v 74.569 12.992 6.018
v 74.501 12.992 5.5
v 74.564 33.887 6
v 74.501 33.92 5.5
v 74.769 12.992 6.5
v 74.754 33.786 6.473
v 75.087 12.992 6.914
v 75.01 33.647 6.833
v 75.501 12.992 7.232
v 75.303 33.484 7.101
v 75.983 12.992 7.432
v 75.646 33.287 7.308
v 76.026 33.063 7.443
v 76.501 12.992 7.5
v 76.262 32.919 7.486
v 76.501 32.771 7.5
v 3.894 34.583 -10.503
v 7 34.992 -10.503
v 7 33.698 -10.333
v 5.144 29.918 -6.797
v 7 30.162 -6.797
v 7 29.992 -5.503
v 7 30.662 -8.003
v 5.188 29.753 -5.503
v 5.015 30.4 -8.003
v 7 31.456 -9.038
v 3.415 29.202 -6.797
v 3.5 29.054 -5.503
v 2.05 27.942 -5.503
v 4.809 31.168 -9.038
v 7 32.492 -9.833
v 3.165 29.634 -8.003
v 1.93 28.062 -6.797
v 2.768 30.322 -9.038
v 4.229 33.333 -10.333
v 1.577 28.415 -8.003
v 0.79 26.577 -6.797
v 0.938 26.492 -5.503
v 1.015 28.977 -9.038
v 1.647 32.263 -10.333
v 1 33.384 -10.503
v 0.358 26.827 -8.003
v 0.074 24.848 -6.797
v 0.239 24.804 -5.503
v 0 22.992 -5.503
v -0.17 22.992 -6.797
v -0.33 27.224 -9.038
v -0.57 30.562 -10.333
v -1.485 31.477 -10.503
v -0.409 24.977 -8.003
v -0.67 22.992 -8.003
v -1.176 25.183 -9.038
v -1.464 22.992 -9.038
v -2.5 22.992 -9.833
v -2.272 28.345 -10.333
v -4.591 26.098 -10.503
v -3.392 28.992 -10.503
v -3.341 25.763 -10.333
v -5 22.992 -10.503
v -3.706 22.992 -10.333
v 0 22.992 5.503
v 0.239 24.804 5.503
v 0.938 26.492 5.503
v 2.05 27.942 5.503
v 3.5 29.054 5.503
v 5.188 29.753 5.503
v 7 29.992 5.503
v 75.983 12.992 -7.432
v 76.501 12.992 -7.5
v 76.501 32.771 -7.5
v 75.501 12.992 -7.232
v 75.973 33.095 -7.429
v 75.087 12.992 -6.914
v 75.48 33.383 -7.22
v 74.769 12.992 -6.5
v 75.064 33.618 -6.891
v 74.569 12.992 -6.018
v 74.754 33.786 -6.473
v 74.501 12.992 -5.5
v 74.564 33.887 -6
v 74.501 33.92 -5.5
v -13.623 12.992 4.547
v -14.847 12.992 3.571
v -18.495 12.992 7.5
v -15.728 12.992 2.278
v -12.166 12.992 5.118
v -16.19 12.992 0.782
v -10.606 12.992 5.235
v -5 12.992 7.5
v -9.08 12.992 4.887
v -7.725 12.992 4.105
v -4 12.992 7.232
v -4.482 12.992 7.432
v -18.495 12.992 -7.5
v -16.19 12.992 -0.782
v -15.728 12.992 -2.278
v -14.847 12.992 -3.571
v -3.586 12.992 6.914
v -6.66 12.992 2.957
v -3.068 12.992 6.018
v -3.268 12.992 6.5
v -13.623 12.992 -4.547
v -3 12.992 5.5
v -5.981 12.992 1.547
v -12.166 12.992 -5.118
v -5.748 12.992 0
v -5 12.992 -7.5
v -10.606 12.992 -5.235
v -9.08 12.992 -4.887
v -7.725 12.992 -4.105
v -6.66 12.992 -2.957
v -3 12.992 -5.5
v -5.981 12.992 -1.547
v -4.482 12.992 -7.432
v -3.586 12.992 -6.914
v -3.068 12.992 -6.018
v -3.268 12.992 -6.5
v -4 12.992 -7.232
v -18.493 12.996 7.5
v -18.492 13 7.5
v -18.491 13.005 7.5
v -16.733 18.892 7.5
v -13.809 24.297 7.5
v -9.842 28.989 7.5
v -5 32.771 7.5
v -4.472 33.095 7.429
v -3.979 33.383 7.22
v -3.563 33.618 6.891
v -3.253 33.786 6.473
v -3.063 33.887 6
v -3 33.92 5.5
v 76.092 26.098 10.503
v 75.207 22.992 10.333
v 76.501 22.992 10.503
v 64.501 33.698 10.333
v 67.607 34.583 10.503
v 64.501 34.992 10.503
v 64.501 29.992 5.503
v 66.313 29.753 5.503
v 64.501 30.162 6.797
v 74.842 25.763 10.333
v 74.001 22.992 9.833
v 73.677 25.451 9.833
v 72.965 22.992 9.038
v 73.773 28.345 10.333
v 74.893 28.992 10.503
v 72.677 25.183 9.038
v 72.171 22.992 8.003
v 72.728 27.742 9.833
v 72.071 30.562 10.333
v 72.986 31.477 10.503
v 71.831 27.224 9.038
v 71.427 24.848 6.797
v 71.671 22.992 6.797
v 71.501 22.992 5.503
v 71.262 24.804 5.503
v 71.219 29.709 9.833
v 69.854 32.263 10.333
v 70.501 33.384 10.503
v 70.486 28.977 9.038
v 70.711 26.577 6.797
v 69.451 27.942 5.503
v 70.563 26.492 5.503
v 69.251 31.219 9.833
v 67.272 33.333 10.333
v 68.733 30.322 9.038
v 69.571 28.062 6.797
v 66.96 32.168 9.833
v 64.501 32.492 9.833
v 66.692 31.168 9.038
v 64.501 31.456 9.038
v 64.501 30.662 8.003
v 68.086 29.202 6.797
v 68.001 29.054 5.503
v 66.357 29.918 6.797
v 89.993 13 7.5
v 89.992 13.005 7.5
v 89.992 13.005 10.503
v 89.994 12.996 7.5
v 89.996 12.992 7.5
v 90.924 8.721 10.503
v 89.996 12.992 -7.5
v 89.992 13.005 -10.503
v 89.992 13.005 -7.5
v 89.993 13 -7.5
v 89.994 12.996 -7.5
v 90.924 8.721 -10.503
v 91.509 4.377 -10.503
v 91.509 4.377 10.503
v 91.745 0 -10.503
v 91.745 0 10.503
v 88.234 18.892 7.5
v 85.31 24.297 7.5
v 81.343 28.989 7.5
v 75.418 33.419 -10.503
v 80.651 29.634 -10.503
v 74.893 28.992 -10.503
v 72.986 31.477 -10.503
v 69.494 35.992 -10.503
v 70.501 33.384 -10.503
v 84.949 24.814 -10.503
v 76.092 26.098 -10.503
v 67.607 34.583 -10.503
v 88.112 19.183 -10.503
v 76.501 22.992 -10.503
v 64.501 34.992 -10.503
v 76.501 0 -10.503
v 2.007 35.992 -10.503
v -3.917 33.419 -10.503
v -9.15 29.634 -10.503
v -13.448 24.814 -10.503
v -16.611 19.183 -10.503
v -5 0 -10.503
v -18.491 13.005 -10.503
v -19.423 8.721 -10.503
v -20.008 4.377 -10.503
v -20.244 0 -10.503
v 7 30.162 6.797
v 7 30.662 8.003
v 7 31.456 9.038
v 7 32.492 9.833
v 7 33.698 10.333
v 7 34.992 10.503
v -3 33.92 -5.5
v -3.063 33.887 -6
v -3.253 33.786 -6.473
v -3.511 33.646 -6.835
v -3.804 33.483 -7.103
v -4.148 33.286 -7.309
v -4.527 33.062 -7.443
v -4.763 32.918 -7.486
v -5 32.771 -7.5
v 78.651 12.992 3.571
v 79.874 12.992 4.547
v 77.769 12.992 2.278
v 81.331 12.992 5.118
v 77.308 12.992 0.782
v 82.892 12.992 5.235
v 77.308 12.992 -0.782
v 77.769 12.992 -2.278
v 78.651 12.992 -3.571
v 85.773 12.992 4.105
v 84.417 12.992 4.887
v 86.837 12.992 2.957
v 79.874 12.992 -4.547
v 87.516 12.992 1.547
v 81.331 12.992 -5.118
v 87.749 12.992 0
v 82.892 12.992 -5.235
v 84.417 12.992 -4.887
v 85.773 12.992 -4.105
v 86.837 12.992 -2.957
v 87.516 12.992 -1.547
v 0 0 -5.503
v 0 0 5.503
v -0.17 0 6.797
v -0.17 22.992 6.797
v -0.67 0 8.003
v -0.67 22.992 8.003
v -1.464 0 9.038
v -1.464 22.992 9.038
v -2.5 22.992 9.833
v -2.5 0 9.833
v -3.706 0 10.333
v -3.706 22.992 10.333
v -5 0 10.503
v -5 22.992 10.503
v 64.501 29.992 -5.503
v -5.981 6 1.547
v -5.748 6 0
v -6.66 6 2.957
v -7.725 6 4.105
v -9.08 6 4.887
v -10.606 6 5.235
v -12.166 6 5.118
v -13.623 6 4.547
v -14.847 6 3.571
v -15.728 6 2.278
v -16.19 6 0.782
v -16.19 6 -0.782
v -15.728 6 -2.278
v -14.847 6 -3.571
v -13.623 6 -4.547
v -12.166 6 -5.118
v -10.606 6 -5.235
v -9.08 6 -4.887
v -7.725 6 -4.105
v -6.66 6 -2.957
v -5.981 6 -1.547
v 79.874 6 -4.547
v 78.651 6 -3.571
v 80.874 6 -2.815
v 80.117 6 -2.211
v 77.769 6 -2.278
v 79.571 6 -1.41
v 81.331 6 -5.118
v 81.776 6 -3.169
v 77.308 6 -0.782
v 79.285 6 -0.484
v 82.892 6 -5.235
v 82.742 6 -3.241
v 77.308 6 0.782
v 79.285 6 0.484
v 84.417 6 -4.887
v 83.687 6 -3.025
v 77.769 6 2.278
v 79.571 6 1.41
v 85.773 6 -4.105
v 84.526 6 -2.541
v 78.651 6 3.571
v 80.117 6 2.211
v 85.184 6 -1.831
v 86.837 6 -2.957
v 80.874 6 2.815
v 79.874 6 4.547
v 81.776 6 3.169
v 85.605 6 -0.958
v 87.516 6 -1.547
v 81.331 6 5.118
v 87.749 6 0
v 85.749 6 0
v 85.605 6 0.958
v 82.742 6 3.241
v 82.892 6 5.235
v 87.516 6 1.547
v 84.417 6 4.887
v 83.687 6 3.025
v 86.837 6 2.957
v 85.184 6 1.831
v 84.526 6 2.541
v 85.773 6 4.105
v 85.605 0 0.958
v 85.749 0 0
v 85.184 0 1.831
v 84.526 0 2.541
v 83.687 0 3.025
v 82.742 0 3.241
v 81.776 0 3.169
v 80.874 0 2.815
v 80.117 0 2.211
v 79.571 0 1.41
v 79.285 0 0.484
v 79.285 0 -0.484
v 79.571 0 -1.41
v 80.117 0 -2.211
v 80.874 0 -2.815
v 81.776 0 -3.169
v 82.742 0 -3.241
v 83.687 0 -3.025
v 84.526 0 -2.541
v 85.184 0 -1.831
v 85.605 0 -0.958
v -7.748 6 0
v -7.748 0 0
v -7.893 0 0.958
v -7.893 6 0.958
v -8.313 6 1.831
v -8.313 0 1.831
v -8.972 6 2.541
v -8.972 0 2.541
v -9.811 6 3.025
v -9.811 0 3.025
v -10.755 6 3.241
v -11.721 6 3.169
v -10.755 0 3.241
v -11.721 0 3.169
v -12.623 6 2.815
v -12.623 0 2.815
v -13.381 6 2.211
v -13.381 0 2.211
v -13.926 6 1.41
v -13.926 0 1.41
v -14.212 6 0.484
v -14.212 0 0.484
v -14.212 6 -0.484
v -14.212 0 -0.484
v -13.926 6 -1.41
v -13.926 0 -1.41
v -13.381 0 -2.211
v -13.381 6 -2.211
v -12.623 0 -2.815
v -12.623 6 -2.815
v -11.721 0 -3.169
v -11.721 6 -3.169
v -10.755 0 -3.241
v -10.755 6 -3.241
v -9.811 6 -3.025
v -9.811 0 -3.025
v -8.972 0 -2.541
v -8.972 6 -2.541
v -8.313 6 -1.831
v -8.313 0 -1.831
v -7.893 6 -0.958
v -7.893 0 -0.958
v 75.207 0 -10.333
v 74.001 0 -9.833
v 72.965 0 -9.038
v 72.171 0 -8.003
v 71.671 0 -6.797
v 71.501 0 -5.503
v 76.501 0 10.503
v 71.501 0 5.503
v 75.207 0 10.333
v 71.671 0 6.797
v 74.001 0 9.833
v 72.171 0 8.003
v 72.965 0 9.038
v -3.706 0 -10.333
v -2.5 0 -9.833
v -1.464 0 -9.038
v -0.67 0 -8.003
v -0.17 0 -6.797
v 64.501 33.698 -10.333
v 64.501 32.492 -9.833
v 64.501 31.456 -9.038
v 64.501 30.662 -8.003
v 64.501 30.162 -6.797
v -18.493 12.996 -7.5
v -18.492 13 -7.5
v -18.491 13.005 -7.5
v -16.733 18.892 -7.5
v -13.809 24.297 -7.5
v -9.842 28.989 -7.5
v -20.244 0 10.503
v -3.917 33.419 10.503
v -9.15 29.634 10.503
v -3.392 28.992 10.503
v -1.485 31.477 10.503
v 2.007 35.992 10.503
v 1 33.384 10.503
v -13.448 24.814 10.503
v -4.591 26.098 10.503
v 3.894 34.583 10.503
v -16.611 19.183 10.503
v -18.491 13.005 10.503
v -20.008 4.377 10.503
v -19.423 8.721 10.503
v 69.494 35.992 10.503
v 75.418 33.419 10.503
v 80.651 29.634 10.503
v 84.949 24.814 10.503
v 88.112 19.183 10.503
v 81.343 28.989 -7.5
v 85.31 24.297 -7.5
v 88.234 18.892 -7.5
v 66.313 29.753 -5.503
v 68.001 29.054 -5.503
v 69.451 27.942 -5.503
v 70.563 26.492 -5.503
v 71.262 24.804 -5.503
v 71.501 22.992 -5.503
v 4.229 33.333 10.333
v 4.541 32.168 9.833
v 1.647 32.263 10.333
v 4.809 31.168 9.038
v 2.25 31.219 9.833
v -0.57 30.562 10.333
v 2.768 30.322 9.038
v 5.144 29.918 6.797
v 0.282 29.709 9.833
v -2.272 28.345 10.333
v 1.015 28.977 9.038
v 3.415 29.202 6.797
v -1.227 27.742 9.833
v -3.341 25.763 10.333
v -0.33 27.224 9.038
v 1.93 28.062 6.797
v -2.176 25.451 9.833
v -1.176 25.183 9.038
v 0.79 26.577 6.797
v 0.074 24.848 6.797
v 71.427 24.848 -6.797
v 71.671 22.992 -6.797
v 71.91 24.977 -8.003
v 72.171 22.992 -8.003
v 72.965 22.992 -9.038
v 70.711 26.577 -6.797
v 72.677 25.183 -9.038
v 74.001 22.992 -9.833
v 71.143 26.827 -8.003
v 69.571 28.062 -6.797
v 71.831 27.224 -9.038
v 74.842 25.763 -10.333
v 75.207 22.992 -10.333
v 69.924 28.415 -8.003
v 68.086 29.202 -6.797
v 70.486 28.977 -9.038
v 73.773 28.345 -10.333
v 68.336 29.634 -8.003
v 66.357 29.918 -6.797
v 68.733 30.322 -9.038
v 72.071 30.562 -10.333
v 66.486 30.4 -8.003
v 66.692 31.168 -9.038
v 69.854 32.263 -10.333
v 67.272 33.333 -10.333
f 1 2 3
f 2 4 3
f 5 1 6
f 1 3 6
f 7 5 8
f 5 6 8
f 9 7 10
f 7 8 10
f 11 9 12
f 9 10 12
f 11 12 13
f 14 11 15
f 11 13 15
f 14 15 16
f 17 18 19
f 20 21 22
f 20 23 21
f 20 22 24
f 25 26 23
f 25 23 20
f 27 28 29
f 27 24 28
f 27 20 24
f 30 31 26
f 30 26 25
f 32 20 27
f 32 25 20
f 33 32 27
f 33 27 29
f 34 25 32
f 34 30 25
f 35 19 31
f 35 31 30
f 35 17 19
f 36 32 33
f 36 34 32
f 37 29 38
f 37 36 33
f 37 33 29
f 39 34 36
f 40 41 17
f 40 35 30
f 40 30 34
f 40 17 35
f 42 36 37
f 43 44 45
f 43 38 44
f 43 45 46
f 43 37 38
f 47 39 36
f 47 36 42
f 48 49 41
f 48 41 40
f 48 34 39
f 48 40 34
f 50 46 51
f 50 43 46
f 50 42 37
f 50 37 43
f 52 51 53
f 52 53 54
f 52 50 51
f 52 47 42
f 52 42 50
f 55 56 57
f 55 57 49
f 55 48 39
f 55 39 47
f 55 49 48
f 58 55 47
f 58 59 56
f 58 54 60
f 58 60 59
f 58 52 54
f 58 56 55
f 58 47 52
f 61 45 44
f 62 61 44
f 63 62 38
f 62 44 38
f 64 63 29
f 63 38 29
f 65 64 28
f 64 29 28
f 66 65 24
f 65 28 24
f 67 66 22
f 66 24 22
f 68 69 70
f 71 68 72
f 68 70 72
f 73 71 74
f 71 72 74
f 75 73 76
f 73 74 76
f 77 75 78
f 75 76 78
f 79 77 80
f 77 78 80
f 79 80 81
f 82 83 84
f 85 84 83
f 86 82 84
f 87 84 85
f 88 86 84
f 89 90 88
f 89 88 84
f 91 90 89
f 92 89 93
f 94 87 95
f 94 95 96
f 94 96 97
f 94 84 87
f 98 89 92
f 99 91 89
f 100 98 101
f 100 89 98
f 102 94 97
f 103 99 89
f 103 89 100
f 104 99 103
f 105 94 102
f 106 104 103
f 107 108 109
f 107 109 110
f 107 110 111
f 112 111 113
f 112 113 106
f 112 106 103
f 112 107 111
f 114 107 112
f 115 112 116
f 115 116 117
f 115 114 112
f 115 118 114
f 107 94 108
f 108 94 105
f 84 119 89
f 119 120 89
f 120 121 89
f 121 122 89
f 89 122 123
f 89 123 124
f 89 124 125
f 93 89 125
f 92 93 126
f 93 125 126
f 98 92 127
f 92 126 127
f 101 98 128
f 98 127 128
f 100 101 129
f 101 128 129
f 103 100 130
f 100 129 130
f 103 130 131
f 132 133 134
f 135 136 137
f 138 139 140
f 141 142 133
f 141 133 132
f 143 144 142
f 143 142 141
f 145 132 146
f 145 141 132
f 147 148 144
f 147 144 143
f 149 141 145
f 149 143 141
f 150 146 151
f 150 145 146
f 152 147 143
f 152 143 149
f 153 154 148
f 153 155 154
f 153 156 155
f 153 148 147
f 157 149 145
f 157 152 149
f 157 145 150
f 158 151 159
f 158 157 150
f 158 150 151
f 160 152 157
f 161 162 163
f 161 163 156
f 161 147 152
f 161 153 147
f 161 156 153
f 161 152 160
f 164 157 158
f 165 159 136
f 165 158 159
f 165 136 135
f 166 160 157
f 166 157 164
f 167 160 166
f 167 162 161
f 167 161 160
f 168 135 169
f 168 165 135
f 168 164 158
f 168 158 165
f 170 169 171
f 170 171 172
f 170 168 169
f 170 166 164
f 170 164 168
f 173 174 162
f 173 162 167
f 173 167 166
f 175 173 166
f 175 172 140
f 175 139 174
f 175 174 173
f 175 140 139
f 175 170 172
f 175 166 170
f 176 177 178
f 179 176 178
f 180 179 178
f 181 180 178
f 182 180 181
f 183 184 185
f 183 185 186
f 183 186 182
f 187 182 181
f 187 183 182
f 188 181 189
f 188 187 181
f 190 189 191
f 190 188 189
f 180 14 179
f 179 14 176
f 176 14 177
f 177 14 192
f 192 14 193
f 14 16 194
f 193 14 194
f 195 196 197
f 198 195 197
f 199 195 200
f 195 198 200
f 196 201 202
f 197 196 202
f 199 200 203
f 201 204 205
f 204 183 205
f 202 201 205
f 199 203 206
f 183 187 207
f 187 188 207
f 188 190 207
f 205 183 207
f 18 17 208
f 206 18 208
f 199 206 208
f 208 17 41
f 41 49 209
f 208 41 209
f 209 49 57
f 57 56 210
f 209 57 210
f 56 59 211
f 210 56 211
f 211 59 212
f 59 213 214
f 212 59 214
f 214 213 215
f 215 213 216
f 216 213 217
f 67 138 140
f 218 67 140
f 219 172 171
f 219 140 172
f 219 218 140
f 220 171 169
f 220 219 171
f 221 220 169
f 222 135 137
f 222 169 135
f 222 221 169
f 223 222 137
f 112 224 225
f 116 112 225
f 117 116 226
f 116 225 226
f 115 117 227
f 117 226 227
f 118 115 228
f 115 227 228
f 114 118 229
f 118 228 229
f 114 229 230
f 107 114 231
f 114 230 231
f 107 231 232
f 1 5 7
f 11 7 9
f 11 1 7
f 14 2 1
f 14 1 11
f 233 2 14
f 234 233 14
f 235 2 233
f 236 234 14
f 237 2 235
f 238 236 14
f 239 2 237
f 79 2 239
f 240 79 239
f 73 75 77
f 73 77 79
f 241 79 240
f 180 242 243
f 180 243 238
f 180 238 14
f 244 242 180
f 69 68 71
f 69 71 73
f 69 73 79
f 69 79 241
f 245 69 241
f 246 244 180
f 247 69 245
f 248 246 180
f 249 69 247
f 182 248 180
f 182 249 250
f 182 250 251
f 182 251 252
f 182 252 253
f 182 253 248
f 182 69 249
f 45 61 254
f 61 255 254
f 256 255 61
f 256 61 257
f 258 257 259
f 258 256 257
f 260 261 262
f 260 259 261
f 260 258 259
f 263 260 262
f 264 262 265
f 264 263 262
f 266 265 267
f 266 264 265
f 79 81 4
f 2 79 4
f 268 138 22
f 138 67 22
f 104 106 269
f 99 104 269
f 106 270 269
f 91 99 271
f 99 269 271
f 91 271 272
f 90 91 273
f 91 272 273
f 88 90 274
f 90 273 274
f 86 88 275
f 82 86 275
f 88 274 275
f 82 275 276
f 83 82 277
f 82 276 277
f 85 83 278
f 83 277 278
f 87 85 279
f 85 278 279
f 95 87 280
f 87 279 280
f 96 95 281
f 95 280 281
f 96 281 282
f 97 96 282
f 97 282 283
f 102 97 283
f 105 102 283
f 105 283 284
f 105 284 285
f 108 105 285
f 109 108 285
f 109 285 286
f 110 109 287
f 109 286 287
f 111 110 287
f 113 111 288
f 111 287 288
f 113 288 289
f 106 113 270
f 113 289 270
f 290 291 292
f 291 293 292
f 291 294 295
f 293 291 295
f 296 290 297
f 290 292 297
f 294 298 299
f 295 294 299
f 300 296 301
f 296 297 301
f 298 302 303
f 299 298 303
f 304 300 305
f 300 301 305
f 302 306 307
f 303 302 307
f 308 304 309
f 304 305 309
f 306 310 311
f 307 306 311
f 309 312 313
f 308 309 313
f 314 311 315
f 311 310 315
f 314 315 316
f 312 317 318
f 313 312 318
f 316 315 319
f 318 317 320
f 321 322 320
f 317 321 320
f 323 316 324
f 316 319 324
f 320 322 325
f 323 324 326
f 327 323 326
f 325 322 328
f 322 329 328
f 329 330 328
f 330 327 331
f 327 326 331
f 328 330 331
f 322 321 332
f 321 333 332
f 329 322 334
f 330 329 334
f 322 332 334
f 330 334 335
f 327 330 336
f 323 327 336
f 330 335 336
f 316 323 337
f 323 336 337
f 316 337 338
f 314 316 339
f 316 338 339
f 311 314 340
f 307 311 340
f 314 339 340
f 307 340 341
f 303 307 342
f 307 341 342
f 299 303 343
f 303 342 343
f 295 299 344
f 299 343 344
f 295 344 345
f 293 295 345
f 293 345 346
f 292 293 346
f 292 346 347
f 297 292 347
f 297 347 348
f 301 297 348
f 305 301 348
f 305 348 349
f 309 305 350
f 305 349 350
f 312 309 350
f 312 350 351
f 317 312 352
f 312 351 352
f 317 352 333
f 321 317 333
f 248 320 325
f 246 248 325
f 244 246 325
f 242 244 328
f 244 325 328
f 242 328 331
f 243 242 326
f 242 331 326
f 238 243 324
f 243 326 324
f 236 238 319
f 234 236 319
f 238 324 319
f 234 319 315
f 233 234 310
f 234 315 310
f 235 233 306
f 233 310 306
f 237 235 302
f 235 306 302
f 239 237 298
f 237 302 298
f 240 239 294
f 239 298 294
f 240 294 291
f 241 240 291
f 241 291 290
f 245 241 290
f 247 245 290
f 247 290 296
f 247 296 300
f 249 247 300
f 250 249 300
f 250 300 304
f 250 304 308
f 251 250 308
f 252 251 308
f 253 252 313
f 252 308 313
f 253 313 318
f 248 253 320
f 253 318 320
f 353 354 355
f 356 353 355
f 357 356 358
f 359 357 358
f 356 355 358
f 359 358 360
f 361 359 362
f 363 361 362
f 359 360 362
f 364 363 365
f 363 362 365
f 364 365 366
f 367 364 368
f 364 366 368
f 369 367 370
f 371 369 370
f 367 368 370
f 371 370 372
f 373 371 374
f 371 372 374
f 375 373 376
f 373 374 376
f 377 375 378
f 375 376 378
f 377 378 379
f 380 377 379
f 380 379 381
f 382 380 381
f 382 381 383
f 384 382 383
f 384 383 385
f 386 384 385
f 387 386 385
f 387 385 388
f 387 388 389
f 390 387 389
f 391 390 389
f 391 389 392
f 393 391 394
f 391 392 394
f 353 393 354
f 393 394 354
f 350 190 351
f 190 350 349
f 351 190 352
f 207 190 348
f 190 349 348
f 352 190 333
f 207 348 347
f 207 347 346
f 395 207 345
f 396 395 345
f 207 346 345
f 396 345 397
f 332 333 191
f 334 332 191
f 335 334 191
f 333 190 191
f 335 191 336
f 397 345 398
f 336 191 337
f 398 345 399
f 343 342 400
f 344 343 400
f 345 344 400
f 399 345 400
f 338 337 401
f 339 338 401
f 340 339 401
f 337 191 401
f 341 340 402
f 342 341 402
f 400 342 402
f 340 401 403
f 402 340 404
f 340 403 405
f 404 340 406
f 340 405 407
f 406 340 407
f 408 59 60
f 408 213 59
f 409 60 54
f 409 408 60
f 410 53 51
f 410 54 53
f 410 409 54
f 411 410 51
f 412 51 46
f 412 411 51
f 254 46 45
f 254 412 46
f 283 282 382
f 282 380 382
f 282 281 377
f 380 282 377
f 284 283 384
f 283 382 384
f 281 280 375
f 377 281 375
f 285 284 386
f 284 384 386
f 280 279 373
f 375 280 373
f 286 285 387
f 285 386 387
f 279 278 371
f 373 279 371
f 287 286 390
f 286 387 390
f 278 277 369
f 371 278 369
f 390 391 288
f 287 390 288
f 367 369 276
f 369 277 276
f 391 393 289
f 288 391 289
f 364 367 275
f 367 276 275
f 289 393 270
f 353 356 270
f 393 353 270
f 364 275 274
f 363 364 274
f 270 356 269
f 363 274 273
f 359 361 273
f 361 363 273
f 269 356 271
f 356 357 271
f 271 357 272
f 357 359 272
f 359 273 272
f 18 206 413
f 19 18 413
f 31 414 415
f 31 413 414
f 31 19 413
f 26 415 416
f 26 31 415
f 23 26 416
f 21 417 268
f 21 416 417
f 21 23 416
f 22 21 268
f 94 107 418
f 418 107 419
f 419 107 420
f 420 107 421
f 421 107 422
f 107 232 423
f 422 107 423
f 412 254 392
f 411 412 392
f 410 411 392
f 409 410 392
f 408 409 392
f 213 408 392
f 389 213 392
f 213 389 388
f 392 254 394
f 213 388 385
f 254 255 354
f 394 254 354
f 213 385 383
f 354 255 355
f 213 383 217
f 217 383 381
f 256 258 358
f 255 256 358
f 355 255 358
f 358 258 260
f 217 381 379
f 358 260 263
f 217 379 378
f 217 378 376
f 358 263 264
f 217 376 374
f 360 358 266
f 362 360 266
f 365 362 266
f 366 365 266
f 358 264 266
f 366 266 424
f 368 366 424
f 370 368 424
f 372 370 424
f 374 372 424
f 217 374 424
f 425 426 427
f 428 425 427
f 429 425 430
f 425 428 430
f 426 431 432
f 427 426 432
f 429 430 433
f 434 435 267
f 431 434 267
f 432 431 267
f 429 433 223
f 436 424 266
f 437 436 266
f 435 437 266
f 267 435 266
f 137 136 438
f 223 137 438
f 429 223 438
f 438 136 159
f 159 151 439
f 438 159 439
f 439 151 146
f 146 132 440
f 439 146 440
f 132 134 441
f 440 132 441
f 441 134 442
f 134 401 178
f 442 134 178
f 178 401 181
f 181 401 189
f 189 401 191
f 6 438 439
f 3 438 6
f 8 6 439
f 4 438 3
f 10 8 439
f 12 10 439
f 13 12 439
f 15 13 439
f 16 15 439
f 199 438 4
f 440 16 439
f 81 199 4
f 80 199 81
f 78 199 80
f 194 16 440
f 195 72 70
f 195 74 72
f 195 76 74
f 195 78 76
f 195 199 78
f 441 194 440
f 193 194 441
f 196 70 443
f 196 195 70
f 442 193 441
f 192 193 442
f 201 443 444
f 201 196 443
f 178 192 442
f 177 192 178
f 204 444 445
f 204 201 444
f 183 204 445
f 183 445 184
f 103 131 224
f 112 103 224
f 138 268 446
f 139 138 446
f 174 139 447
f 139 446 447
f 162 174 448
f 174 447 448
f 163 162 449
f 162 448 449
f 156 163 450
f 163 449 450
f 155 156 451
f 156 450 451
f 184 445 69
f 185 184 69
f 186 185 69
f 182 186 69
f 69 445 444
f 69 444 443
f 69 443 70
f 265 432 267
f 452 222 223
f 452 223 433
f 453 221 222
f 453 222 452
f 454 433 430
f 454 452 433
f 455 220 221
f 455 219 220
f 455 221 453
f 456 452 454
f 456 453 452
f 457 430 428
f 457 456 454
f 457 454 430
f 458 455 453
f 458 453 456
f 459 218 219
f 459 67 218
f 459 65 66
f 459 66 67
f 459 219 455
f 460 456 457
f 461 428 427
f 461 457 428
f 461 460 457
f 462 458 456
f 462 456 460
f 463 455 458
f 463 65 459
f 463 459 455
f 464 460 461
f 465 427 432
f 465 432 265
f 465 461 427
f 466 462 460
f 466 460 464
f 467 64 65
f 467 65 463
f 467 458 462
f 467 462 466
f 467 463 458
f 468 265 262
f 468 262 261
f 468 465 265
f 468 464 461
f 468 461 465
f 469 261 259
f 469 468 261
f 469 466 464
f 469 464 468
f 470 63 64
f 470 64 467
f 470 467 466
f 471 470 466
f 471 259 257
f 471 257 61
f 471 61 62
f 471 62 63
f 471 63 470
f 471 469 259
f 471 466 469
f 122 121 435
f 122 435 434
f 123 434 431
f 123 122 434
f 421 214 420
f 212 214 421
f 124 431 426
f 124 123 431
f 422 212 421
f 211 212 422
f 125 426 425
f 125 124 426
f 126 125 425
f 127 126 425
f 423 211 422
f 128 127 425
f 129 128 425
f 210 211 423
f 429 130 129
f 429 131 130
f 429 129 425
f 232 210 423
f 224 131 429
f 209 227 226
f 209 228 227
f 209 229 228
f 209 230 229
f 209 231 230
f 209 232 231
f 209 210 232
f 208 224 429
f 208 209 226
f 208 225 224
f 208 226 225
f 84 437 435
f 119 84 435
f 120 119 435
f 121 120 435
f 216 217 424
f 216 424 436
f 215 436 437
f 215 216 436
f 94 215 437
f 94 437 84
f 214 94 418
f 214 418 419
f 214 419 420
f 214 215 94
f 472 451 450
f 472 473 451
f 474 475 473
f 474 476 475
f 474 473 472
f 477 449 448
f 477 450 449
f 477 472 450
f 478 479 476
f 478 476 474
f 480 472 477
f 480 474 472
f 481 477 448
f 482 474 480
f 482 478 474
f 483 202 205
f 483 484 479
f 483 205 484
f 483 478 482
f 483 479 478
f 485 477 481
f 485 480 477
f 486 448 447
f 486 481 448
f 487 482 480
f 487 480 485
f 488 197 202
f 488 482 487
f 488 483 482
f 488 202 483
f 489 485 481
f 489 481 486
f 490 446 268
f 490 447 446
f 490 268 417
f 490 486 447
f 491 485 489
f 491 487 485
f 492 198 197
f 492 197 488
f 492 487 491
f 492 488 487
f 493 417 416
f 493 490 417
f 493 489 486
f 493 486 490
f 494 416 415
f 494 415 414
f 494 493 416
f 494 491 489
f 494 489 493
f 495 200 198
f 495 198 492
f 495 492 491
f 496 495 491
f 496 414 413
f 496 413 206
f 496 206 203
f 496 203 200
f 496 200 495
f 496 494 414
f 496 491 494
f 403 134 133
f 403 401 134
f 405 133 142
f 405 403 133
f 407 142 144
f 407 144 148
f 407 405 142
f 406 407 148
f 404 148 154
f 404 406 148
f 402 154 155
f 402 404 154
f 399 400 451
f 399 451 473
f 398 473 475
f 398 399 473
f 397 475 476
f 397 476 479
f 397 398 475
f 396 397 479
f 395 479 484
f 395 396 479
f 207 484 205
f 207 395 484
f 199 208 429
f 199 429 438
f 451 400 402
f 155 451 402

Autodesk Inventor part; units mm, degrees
ref_plane "YZ Plane" through (0, 0, 0) normal (1, 0, 0) x (0, 1, 0)
ref_plane "XZ Plane" through (0, 0, 0) normal (0, 1, 0) x (-1, 0, 0)
ref_plane "XY Plane" through (0, 0, 0) normal (0, 0, 1) x (1, 0, 0)
sketch "Sketch_19" plane through (0, 0, 0) normal (0, 1, 0) x (-1, 0, 0)
  line L0 (20.2438, -10.5029) -> (20.2438, 10.5029)
  line L1 (20.2438, 10.5029) -> (5, 10.5029)
  arc A0 (5, 10.5029) -> (0, 5.5029) centre (5, 5.5029) ccw
  line L2 (0, 5.5029) -> (0, -5.5029)
  arc A1 (0, -5.5029) -> (5, -10.5029) centre (5, -5.5029) ccw
  line L3 (5, -10.5029) -> (20.2438, -10.5029)
extrude "Extrusion1" add sketch "Sketch_19" along normal blind 22.9918
sketch "Sketch_20" plane through (0, 22.9918, 0) normal (0, 1, 0) x (1, 0, 0)
  line L0 (7, 5.5029) -> (7, -5.5029)
  line L1 (-20.2438, 10.5029) -> (-20.2438, -10.5029)
  line L2 (-20.2438, -10.5029) -> (-5, -10.5029)
  arc A0 (-5, -10.5029) -> (0, -5.5029) centre (-5, -5.5029) ccw
  line L3 (0, -5.5029) -> (0, 5.5029)
  arc A1 (0, 5.5029) -> (-5, 10.5029) centre (-5, 5.5029) ccw
  line L4 (-5, 10.5029) -> (-20.2438, 10.5029)
revolve "Revolution1" add sketch "Sketch_20" angle 90 about axis through (7, 22.9918, -5.5029) along (0, 0, -1)
sketch "Sketch_21" plane through (7, 0, 0) normal (1, 0, 0) x (0, 0, -1)
  arc A0 (-10.5029, 34.9918) -> (-5.5029, 29.9918) centre (-5.5029, 34.9918) ccw
  line L0 (-5.5029, 29.9918) -> (5.5029, 29.9918)
  arc A1 (5.5029, 29.9918) -> (10.5029, 34.9918) centre (5.5029, 34.9918) ccw
  line L1 (10.5029, 34.9918) -> (10.5029, 50.2356)
  line L2 (10.5029, 50.2356) -> (-10.5029, 50.2356)
  line L3 (-10.5029, 50.2356) -> (-10.5029, 34.9918)
extrude "Extrusion2" add sketch "Sketch_21" along normal blind 57.501
sketch "Sketch_22" plane through (64.501, 0, 0) normal (1, 0, 0) x (0, 0, -1)
  line L0 (5.5029, 22.9918) -> (-5.5029, 22.9918)
  arc A0 (-10.5029, 34.9918) -> (-5.5029, 29.9918) centre (-5.5029, 34.9918) ccw
  line L1 (-5.5029, 29.9918) -> (5.5029, 29.9918)
  arc A1 (5.5029, 29.9918) -> (10.5029, 34.9918) centre (5.5029, 34.9918) ccw
  line L2 (10.5029, 34.9918) -> (10.5029, 50.2356)
  line L3 (10.5029, 50.2356) -> (-10.5029, 50.2356)
  line L4 (-10.5029, 50.2356) -> (-10.5029, 34.9918)
revolve "Revolution2" add sketch "Sketch_22" angle 90 about axis through (64.501, 22.9918, -5.5029) along (0, 0, -1)
sketch "Sketch_23" plane through (0, 0, 0) normal (0, 1, 0) x (-1, 0, 0)
  arc A0 (-71.501, 5.5029) -> (-76.501, 10.5029) centre (-76.501, 5.5029) ccw
  line L0 (-76.501, 10.5029) -> (-91.7448, 10.5029)
  line L1 (-91.7448, 10.5029) -> (-91.7448, -10.5029)
  line L2 (-91.7448, -10.5029) -> (-76.501, -10.5029)
  arc A1 (-76.501, -10.5029) -> (-71.501, -5.5029) centre (-76.501, -5.5029) ccw
  line L3 (-71.501, -5.5029) -> (-71.501, 5.5029)
extrude "Extrusion3" add sketch "Sketch_23" along normal blind 22.9918
sketch "Sketch_24" plane through (0, 0, 0) normal (0, 0, 1) x (1, 0, 0)
  line L0 (-32.9438, 71.9836) -> (-32.9438, 0)
  line L1 (-32.9438, 0) -> (-20.2438, 0)
  arc A0 (-18.4912, 13.0048) -> (-20.2438, 0) centre (34.459, -0.7516) ccw
  arc A1 (2.0066, 35.9918) -> (-18.4912, 13.0048) centre (10.8872, 7.4403) ccw
  line L2 (2.0066, 35.9918) -> (69.4944, 35.9918)
  arc A2 (89.9922, 13.0048) -> (69.4944, 35.9918) centre (60.6138, 7.4403) ccw
  arc A3 (91.7448, 0) -> (89.9922, 13.0048) centre (37.042, -0.7516) ccw
  line L3 (91.7448, 0) -> (104.4448, 0)
  line L4 (104.4448, 0) -> (104.4448, 71.9836)
  line L5 (104.4448, 71.9836) -> (-32.9438, 71.9836)
extrude "Extrusion4" cut sketch "Sketch_24" along normal mid plane 42.0116
sketch "Sketch_25" plane through (0, 0, 0) normal (0, 0, 1) x (1, 0, 0)
  line L0 (82.4992, 0) -> (82.4992, 35.9918)
  line L1 (82.4992, 35.9918) -> (87.7492, 35.9918)
  line L2 (87.7492, 35.9918) -> (87.7492, 6)
  line L3 (87.7492, 6) -> (85.7492, 6)
  line L4 (85.7492, 6) -> (85.7492, 0)
  line L5 (85.7492, 0) -> (82.4992, 0)
  line L6 (82.4992, 0) -> (82.4992, 35.9918)
revolve "Revolution3" cut sketch "Sketch_25" angle 360 about axis through (82.4992, 0, 0) along (0, -1, 0)
sketch "Sketch_26" plane through (0, 0, 0) normal (0, 0, 1) x (1, 0, 0)
  line L0 (-10.9982, 0) -> (-10.9982, 35.9918)
  line L1 (-10.9982, 35.9918) -> (-5.7482, 35.9918)
  line L2 (-5.7482, 35.9918) -> (-5.7482, 6)
  line L3 (-5.7482, 6) -> (-7.7482, 6)
  line L4 (-7.7482, 6) -> (-7.7482, 0)
  line L5 (-7.7482, 0) -> (-10.9982, 0)
  line L6 (-10.9982, 0) -> (-10.9982, 35.9918)
revolve "Revolution4" cut sketch "Sketch_26" angle 360 about axis through (-10.9982, 0, 0) along (0, -1, 0)
sketch "Sketch_27" plane through (0, 35.9918, 0) normal (0, 1, 0) x (1, 0, 0)
  line L0 (-32.9438, 23.2029) -> (-32.9438, -7.5)
  line L1 (-32.9438, -7.5) -> (-5, -7.5)
  arc A0 (-5, -7.5) -> (-3, -5.5) centre (-5, -5.5) ccw
  line L2 (-3, -5.5) -> (-3, 5.5)
  arc A1 (-3, 5.5) -> (-5, 7.5) centre (-5, 5.5) ccw
  line L3 (-5, 7.5) -> (-20.2438, 7.5)
  line L4 (-20.2438, 7.5) -> (-20.2438, 10.5029)
  line L5 (-20.2438, 10.5029) -> (91.7448, 10.5029)
  line L6 (91.7448, 10.5029) -> (91.7448, 7.5)
  line L7 (91.7448, 7.5) -> (76.501, 7.5)
  arc A2 (76.501, 7.5) -> (74.501, 5.5) centre (76.501, 5.5) ccw
  line L8 (74.501, 5.5) -> (74.501, -5.5)
  arc A3 (74.501, -5.5) -> (76.501, -7.5) centre (76.501, -5.5) ccw
  line L9 (76.501, -7.5) -> (104.4448, -7.5)
  line L10 (104.4448, -7.5) -> (104.4448, 23.2029)
  line L11 (104.4448, 23.2029) -> (-32.9438, 23.2029)
extrude "Extrusion5" cut sketch "Sketch_27" against normal blind 23
properties part number "2062"
